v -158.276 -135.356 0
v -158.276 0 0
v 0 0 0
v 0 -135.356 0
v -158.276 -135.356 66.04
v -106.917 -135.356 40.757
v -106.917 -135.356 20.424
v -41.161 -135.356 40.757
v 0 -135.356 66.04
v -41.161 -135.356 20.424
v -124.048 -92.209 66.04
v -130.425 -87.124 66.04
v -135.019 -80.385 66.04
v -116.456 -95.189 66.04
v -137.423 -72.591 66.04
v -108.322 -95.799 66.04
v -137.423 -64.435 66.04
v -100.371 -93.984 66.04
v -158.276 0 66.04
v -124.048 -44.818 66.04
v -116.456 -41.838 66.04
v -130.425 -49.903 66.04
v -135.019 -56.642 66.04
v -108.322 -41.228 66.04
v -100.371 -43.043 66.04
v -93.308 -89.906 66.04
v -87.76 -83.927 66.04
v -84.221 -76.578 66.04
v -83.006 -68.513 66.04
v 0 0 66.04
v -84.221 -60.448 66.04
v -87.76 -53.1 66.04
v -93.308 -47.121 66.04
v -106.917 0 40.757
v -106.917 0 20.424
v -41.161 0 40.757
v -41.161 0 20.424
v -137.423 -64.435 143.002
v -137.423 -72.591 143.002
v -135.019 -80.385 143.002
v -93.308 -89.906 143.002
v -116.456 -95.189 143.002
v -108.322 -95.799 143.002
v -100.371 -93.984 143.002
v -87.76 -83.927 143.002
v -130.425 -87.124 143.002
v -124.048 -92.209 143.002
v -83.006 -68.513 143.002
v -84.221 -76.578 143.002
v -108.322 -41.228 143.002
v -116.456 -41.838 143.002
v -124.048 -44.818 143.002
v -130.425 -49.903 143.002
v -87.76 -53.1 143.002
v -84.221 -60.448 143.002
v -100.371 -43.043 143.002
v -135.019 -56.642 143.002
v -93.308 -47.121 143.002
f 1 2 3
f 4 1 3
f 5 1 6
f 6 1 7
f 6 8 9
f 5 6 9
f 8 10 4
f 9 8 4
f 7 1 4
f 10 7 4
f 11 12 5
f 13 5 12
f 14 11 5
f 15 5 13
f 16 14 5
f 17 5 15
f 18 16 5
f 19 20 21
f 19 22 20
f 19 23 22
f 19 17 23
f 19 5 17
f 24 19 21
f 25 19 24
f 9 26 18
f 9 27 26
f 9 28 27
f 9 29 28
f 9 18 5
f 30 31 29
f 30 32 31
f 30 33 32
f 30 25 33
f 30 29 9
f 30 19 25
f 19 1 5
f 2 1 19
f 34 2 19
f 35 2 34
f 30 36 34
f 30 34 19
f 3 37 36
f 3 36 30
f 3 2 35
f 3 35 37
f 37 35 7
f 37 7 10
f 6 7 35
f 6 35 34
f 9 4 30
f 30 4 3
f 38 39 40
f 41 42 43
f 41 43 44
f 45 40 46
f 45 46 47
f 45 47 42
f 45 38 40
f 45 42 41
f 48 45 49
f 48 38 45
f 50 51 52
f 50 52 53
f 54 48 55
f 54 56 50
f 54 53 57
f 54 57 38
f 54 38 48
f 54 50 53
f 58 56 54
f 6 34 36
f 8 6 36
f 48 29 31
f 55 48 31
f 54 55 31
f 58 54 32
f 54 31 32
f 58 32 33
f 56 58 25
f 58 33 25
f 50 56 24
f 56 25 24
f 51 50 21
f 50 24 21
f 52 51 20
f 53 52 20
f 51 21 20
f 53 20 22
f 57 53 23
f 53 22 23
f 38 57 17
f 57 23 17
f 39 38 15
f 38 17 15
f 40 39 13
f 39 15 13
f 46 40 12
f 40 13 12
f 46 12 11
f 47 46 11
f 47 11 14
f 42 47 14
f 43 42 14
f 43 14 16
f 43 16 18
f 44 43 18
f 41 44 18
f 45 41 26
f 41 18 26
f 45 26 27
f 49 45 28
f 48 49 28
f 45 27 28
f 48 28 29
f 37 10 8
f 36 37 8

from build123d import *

# Parameters (mm, degrees)
F0_W     = 158.276036
F0_H     = 135.355964
F1_DEPTH = 66.04
F2_R     = 27.36159
F3_DEPTH = 76.962
F4_W     = 65.755699
F4_H     = 20.332886
F5_DEPTH = 178.308


with BuildPart() as f1:
    # F0 (on Top) → F1 (new body)
    with BuildSketch(Plane.XY):
        with Locations((-79.138018, -67.677982)):
            Rectangle(F0_W, F0_H)
    extrude(amount=F1_DEPTH)

    # F2 (on face) → F3 (join)
    with BuildSketch(Plane.XY.offset(66.04)):
        with Locations((-110.367209, -68.513423)):
            Circle(F2_R)
    extrude(amount=F3_DEPTH)

    # F4 (on face) → F5 (cut)
    with BuildSketch(Plane.XZ.offset(135.355964)):
        with Locations((-74.039189, 30.590639)):
            Rectangle(F4_W, F4_H)
    extrude(amount=-F5_DEPTH, mode=Mode.SUBTRACT)


solid = f1.part
